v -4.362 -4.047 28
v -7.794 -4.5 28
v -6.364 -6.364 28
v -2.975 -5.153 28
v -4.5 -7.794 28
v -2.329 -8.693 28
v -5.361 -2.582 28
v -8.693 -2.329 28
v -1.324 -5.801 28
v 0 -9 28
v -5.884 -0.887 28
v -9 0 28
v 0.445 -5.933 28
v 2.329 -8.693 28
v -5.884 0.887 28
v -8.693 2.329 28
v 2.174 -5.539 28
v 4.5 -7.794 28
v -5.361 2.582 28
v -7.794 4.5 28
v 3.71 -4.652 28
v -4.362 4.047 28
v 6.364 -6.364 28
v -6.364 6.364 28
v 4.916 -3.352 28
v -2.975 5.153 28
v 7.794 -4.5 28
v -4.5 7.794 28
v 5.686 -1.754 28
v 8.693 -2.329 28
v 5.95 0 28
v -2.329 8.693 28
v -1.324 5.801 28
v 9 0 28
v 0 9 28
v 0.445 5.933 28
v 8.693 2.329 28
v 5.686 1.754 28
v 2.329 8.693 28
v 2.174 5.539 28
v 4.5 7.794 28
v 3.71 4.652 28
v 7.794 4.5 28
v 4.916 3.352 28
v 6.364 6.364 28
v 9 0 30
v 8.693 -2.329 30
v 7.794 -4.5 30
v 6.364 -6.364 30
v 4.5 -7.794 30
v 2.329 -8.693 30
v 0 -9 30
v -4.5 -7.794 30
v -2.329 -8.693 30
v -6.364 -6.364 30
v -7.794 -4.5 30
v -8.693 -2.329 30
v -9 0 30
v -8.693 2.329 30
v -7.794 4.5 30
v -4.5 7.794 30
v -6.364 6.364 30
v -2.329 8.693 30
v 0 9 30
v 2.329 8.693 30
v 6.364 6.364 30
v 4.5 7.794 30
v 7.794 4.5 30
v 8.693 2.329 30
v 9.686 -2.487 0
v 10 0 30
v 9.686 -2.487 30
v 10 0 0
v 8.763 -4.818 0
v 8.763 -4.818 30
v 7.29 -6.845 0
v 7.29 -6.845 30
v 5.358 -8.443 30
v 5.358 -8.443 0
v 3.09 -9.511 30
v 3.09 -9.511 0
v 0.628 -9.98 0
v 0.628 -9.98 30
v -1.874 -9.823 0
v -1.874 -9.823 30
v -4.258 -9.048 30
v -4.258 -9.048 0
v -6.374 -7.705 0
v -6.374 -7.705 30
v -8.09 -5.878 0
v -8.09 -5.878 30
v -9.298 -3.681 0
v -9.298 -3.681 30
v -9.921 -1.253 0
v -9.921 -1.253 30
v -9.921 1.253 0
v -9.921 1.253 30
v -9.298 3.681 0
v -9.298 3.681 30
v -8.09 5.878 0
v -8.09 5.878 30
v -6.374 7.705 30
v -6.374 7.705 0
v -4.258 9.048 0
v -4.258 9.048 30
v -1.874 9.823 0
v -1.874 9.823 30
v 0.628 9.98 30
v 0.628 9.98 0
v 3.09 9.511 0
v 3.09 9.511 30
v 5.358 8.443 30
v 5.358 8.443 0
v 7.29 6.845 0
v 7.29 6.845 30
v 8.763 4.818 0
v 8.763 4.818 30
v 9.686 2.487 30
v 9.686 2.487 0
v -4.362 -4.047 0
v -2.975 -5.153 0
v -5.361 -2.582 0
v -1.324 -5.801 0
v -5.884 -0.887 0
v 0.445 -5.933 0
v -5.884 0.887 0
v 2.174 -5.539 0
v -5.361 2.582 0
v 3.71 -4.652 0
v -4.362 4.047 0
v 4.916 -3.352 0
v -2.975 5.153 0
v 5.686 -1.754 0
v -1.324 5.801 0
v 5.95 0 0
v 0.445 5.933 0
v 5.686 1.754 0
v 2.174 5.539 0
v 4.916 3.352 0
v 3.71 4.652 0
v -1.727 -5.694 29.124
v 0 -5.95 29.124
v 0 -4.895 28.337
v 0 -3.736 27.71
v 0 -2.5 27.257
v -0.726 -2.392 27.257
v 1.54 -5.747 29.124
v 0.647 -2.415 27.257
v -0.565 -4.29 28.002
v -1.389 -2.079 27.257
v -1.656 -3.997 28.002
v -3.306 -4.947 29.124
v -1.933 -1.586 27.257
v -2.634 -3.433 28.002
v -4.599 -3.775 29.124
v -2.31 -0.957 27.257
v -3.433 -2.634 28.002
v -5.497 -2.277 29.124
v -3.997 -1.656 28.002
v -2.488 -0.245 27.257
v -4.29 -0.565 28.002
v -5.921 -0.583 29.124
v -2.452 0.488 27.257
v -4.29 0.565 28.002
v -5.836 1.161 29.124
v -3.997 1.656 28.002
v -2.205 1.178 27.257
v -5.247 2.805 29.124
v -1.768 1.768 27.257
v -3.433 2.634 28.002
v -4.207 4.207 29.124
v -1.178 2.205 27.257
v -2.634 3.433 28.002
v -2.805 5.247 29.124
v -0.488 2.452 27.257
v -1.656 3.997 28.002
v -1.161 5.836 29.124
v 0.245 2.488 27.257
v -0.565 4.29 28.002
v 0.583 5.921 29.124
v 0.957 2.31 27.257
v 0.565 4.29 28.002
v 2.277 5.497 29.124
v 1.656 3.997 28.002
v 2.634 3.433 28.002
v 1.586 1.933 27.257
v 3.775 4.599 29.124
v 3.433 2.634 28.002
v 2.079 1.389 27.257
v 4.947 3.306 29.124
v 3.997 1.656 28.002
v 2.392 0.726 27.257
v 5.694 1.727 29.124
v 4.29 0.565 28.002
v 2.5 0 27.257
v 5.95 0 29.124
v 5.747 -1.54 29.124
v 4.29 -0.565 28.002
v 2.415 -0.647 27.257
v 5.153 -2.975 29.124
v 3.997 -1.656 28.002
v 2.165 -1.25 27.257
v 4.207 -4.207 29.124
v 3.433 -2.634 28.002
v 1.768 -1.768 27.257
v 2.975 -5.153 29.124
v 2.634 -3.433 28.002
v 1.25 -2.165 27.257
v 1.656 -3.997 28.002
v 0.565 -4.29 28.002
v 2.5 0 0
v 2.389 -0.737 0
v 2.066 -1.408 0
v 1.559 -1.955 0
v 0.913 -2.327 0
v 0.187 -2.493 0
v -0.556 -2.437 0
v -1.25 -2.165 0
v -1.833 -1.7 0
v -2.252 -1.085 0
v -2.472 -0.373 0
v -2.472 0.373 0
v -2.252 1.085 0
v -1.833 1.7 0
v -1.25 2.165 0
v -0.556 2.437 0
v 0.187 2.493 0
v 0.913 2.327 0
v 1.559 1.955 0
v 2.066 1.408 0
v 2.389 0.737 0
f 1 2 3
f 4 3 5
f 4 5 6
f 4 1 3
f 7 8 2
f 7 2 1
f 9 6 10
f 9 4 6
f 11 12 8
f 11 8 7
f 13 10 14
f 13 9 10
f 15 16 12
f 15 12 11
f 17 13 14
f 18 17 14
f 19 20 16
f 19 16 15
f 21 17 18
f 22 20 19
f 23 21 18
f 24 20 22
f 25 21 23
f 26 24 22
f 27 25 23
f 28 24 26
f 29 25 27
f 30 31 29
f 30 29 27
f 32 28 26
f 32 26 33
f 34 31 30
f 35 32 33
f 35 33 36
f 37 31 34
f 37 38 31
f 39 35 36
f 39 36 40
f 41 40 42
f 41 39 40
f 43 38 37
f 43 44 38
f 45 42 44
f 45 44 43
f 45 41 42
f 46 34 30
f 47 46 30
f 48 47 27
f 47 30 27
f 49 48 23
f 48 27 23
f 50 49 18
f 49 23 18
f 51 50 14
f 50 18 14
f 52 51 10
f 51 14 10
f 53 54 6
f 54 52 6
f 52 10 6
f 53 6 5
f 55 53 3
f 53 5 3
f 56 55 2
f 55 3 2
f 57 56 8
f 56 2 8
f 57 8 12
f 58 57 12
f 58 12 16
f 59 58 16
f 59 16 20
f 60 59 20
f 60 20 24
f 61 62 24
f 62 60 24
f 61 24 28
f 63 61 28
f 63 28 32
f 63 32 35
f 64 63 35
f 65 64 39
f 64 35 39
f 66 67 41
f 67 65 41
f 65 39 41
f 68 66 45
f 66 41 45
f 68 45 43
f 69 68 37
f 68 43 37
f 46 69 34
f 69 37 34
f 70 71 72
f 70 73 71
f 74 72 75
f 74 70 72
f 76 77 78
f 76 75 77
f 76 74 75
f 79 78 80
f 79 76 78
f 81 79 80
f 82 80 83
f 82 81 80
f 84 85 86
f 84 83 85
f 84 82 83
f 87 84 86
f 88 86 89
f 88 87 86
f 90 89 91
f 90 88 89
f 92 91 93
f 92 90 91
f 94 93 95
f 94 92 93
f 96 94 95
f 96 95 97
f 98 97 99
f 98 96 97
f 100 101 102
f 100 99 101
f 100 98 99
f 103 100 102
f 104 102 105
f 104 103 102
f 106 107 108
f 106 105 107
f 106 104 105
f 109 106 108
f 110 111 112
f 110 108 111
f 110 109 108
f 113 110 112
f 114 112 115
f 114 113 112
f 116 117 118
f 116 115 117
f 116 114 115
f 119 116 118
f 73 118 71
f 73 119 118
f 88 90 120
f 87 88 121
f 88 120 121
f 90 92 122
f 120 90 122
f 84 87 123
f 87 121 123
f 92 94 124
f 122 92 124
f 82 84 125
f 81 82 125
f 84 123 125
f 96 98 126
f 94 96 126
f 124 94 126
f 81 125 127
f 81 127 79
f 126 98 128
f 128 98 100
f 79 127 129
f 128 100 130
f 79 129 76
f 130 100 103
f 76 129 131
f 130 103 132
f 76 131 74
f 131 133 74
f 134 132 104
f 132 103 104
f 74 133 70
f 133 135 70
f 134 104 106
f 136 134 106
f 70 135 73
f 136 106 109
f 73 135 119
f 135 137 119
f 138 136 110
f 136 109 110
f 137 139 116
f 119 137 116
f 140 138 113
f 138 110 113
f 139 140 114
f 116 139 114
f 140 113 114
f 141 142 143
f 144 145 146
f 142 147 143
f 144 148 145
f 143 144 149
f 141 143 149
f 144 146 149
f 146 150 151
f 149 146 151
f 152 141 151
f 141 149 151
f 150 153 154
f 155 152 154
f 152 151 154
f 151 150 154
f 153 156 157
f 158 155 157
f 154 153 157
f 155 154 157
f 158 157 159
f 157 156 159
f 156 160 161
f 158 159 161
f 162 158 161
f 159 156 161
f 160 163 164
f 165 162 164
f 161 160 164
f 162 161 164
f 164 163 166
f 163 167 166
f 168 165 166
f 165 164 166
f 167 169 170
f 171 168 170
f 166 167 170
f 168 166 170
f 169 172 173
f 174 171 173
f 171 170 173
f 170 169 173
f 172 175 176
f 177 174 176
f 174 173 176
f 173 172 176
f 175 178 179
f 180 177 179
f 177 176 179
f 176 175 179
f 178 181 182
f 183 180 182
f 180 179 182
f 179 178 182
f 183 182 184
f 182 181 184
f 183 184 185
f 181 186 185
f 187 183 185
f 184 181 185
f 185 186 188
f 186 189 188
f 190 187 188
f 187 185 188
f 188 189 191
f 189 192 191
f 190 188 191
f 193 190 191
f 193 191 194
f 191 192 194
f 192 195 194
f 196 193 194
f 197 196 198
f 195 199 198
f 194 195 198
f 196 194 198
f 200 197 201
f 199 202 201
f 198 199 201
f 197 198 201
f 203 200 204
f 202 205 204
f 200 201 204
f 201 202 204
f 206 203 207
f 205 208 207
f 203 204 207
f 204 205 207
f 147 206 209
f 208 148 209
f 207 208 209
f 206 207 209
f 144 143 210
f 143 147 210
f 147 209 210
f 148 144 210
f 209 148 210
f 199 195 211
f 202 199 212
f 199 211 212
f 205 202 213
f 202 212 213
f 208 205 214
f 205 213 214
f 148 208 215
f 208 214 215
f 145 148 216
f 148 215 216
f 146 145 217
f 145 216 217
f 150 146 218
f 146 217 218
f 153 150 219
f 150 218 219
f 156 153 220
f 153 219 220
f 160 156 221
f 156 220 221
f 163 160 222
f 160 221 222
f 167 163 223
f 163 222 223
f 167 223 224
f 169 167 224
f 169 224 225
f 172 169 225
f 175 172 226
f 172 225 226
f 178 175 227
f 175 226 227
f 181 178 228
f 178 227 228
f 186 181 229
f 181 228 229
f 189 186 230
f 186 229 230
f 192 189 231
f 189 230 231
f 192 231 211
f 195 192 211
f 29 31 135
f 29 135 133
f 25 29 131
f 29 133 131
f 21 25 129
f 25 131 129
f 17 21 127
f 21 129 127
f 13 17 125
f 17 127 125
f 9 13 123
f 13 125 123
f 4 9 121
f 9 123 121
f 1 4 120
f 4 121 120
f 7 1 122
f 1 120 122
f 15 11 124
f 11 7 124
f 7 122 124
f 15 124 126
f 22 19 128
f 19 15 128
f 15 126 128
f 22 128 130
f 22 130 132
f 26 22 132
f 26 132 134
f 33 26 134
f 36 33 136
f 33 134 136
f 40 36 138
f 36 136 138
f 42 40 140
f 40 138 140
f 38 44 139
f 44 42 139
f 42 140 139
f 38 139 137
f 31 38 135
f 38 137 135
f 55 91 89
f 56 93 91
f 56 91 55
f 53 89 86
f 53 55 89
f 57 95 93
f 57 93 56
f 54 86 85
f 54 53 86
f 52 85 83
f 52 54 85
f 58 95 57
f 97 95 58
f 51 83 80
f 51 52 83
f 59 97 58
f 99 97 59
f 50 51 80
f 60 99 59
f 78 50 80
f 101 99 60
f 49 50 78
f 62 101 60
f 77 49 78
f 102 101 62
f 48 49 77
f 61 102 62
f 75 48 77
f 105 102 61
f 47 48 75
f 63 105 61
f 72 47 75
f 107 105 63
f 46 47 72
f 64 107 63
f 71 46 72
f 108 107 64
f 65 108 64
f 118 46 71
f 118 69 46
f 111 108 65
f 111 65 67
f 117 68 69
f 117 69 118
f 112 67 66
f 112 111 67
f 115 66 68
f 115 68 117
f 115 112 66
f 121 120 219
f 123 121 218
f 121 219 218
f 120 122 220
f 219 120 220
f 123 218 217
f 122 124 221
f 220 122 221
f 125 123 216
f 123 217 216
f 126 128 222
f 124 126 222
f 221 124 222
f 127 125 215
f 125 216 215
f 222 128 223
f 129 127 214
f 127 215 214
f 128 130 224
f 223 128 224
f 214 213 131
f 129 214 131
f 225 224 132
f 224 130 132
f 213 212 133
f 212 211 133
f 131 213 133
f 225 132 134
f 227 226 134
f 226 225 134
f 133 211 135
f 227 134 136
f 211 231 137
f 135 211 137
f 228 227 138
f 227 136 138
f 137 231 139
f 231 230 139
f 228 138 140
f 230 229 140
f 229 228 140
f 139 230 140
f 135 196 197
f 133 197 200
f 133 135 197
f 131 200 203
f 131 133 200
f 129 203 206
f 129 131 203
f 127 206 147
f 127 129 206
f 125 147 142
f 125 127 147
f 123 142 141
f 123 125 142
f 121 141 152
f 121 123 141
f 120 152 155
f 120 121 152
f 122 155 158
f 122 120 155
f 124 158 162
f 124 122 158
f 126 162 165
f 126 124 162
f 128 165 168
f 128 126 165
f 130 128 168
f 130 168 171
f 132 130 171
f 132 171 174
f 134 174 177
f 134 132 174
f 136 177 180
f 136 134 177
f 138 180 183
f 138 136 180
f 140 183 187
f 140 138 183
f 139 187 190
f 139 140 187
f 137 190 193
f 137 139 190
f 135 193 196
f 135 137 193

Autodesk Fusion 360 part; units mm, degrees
sketch "Sketch1" plane through (0, 0, 0) normal (0, 0, 1) x (1, 0, 0)
  circle A0 centre (0, 0) radius 10
  circle A1 centre (0, 0) radius 9
  circle A2 centre (0, 0) radius 5.95
  circle A3 centre (0, 0) radius 2.5
  dimension "d1" = 20
  dimension "d2" = 18
  dimension "d3" = 11.9
  dimension "d8" = 5
extrude "Extrude1" add sketch "Sketch1" along normal blind 30 makes body 1 at (9.9503, -0.9957, 20) makes body 2 at (5.9204, -0.5924, 20)
extrude "Extrude2" add sketch "Sketch1" along normal blind 28 contours A1 bodies 1
sketch "Sketch2" plane through (0, 0, 0) normal (1, 0, 0) x (0, 0, -1)
  circle A0 centre (-30, 7.5) radius 1.5
  arc A1 (-36, -9.093) -> (-26.907, 0) centre (-36, 0) ccw
  line L0 (-1.75, 0) -> (-22.5, 0)
  line L1 (-26.907, 0) -> (-36, 0)
  line L2 (-36, 0) -> (-36, -9.093)
  dimension "d10" = 3
  dimension "d11" = 7.5
  dimension "d13" = 36
revolve "Revolve1" cut sketch "Sketch2" angle 360 about axis through (0, 0, 1.75) along (0, 0, 1) contours A1 L1 L2 bodies 2
equation "d3 = d2 - ( 2 * 3.05 ) * 1 mm"
equation "d8 = stepperaxis"
equation "stepperaxis = 5 mm"
